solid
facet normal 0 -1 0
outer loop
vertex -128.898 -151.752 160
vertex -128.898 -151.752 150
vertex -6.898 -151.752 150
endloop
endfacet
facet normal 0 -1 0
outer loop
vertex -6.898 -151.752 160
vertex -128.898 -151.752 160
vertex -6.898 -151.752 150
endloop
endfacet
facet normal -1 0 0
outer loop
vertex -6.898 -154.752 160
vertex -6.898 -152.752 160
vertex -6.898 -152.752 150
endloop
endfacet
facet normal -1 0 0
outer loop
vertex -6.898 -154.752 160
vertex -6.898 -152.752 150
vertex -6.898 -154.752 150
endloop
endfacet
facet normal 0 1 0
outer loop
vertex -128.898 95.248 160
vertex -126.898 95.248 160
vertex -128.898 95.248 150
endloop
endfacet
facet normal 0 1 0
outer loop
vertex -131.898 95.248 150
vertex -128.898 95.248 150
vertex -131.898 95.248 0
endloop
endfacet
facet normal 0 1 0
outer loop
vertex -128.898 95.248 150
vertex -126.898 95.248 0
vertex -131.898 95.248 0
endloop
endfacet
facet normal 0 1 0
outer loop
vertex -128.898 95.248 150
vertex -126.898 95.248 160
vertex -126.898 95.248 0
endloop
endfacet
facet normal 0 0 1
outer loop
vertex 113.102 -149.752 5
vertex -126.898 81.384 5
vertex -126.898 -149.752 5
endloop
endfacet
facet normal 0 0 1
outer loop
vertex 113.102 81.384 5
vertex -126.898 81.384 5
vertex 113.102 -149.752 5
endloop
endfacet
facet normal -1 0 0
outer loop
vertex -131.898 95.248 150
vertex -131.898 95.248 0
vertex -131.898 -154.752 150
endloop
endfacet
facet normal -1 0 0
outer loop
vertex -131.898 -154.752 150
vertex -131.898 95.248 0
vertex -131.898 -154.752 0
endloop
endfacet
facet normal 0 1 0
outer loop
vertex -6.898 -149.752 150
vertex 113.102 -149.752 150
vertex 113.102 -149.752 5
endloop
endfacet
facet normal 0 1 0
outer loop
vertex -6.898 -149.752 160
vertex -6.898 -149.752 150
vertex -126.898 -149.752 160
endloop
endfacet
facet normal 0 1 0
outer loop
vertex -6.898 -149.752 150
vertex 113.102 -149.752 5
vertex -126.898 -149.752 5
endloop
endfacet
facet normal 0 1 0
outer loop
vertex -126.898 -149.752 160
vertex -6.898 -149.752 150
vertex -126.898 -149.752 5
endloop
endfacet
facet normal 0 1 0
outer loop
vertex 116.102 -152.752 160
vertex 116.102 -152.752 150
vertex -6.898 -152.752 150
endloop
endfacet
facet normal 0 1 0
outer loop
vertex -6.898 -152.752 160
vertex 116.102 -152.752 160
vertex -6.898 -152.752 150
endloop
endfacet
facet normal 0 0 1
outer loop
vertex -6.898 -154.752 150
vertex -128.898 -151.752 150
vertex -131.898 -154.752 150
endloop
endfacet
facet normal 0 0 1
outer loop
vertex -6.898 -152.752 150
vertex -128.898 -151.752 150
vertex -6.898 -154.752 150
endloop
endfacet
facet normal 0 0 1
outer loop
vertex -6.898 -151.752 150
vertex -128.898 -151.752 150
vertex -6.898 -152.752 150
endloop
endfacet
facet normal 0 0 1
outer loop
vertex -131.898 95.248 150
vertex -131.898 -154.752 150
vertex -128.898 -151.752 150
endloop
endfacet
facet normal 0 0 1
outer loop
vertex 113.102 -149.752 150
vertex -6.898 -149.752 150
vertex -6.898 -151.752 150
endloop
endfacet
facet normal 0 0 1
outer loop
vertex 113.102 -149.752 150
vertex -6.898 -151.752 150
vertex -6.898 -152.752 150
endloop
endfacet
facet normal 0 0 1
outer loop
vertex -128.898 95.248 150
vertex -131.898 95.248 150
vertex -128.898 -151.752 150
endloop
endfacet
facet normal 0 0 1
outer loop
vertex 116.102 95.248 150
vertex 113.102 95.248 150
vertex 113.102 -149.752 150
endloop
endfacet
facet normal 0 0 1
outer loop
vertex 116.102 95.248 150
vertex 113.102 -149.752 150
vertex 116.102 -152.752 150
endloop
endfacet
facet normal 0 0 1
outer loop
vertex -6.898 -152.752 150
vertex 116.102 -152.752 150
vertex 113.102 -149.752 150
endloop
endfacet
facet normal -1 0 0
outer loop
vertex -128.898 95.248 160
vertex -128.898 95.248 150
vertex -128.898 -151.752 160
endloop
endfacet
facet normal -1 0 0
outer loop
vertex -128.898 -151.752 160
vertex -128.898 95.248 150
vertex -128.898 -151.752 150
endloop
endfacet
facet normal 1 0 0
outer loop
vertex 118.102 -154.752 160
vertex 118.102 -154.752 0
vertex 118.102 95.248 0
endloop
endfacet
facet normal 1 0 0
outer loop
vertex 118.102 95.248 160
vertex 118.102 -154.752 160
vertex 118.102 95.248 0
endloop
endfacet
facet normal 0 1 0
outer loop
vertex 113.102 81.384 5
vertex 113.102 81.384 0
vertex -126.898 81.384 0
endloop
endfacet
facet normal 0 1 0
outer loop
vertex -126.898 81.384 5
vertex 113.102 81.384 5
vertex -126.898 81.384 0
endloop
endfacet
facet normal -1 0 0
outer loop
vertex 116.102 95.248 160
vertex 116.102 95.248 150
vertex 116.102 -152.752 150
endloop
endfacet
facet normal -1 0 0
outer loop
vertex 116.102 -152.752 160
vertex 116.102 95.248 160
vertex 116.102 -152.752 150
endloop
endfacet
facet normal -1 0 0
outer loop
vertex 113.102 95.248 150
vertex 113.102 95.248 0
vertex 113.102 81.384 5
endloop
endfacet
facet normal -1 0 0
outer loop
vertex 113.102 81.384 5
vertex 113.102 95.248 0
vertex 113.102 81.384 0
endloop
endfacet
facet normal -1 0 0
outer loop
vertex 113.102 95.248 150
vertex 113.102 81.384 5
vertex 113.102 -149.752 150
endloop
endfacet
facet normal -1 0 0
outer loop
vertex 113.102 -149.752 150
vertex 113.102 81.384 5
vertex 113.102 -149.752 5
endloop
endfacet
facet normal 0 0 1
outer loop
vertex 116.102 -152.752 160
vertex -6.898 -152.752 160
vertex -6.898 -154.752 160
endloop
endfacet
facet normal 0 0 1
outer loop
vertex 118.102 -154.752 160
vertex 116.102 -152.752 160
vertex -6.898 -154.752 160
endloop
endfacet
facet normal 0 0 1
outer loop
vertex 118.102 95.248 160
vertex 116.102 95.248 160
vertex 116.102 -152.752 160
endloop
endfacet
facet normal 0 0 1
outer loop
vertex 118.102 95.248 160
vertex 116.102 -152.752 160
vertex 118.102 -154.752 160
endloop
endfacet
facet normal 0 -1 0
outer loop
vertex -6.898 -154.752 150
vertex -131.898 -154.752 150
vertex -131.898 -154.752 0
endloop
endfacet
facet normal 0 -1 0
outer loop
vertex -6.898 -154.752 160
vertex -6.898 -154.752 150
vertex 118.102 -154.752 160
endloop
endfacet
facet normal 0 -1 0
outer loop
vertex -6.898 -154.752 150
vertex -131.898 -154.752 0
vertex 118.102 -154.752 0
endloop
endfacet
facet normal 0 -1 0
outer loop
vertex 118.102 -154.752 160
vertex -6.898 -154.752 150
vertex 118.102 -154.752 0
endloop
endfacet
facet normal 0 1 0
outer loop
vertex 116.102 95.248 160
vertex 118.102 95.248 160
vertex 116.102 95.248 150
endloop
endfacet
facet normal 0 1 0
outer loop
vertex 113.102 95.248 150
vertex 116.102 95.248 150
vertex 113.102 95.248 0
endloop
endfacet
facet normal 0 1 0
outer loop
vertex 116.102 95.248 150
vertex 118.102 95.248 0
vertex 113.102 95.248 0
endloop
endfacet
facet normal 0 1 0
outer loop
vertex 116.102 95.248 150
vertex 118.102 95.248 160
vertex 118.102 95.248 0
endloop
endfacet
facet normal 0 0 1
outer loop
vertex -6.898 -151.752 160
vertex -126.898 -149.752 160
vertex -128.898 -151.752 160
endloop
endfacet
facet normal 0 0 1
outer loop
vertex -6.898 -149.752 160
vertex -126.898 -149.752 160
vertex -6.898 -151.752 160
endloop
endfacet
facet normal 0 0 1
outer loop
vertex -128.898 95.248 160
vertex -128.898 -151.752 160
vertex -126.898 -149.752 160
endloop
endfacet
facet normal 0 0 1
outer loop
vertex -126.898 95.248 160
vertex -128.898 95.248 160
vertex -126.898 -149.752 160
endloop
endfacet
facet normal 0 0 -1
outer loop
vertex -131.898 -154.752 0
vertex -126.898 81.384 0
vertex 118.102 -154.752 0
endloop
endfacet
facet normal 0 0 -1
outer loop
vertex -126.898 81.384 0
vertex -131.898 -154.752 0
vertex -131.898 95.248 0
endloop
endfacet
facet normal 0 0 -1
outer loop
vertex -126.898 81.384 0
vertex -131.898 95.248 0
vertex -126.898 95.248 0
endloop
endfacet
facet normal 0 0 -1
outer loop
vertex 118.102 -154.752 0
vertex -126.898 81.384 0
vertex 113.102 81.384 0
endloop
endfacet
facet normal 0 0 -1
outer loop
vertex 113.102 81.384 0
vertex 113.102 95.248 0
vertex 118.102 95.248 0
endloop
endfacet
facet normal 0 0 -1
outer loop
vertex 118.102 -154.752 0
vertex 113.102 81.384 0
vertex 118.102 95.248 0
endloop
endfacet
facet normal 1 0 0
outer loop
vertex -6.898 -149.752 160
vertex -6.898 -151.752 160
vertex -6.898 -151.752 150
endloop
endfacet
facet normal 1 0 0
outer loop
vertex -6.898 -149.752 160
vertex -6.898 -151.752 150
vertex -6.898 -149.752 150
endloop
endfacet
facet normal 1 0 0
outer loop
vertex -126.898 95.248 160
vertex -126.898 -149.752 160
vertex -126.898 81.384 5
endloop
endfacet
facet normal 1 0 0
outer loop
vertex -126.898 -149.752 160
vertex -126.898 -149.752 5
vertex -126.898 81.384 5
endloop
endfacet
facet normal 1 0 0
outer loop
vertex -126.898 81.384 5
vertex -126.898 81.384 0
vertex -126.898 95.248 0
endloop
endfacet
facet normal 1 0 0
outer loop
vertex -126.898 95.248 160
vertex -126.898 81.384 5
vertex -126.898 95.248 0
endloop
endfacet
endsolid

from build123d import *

# Parameters (mm, degrees)
F1_DEPTH = 5
F2_W     = 240
F2_H     = 5
F3_DEPTH = 145
F5_DEPTH = 10
F6_DEPTH = 10


with BuildPart() as f1:
    # F0 (on Top) → F1 (new body)
    with BuildSketch(Plane.XY):
        Polygon((-126.897684, 95.248217), (-131.897684, 95.248217), (-131.897684, -154.751783), (118.102316, -154.751783), (118.102316, 95.248217), (113.102316, 95.248217), (113.102316, 81.383812), (-126.897684, 81.383812), align=None)
    extrude(amount=F1_DEPTH)

    # F2 (on face) → F3 (join)
    with BuildSketch(Plane.XY.offset(5)):
        Polygon((-126.897684, -149.751783), (-126.897684, 95.248217), (-131.897684, 95.248217), (-131.897684, -154.751783), (-126.897684, -154.751783), align=None)
        with Locations((-6.897684, -152.251783)):
            Rectangle(F2_W, F2_H)
        Polygon((113.102316, 95.248217), (113.102316, -149.751783), (113.102316, -154.751783), (118.102316, -154.751783), (118.102316, 95.248217), align=None)
    extrude(amount=F3_DEPTH)

    # F4 (on face) → F5 (join)
    with BuildSketch(Plane.XY.offset(150)):
        Polygon((-128.897684, -151.751783), (-6.897684, -151.751783), (-6.897684, -149.751783), (-126.897684, -149.751783), align=None)
        Polygon((-128.897684, 95.248217), (-128.897684, -151.751783), (-126.897684, -149.751783), (-126.897684, 95.248217), align=None)
    extrude(amount=F5_DEPTH)

    # F4 (on face) → F6 (join)
    with BuildSketch(Plane.XY.offset(150)):
        Polygon((118.102316, 95.248217), (116.102316, 95.248217), (116.102316, -152.751783), (118.102316, -154.751783), align=None)
        Polygon((118.102316, -154.751783), (116.102316, -152.751783), (-6.897684, -152.751783), (-6.897684, -154.751783), align=None)
    extrude(amount=F6_DEPTH)


solid = f1.part
